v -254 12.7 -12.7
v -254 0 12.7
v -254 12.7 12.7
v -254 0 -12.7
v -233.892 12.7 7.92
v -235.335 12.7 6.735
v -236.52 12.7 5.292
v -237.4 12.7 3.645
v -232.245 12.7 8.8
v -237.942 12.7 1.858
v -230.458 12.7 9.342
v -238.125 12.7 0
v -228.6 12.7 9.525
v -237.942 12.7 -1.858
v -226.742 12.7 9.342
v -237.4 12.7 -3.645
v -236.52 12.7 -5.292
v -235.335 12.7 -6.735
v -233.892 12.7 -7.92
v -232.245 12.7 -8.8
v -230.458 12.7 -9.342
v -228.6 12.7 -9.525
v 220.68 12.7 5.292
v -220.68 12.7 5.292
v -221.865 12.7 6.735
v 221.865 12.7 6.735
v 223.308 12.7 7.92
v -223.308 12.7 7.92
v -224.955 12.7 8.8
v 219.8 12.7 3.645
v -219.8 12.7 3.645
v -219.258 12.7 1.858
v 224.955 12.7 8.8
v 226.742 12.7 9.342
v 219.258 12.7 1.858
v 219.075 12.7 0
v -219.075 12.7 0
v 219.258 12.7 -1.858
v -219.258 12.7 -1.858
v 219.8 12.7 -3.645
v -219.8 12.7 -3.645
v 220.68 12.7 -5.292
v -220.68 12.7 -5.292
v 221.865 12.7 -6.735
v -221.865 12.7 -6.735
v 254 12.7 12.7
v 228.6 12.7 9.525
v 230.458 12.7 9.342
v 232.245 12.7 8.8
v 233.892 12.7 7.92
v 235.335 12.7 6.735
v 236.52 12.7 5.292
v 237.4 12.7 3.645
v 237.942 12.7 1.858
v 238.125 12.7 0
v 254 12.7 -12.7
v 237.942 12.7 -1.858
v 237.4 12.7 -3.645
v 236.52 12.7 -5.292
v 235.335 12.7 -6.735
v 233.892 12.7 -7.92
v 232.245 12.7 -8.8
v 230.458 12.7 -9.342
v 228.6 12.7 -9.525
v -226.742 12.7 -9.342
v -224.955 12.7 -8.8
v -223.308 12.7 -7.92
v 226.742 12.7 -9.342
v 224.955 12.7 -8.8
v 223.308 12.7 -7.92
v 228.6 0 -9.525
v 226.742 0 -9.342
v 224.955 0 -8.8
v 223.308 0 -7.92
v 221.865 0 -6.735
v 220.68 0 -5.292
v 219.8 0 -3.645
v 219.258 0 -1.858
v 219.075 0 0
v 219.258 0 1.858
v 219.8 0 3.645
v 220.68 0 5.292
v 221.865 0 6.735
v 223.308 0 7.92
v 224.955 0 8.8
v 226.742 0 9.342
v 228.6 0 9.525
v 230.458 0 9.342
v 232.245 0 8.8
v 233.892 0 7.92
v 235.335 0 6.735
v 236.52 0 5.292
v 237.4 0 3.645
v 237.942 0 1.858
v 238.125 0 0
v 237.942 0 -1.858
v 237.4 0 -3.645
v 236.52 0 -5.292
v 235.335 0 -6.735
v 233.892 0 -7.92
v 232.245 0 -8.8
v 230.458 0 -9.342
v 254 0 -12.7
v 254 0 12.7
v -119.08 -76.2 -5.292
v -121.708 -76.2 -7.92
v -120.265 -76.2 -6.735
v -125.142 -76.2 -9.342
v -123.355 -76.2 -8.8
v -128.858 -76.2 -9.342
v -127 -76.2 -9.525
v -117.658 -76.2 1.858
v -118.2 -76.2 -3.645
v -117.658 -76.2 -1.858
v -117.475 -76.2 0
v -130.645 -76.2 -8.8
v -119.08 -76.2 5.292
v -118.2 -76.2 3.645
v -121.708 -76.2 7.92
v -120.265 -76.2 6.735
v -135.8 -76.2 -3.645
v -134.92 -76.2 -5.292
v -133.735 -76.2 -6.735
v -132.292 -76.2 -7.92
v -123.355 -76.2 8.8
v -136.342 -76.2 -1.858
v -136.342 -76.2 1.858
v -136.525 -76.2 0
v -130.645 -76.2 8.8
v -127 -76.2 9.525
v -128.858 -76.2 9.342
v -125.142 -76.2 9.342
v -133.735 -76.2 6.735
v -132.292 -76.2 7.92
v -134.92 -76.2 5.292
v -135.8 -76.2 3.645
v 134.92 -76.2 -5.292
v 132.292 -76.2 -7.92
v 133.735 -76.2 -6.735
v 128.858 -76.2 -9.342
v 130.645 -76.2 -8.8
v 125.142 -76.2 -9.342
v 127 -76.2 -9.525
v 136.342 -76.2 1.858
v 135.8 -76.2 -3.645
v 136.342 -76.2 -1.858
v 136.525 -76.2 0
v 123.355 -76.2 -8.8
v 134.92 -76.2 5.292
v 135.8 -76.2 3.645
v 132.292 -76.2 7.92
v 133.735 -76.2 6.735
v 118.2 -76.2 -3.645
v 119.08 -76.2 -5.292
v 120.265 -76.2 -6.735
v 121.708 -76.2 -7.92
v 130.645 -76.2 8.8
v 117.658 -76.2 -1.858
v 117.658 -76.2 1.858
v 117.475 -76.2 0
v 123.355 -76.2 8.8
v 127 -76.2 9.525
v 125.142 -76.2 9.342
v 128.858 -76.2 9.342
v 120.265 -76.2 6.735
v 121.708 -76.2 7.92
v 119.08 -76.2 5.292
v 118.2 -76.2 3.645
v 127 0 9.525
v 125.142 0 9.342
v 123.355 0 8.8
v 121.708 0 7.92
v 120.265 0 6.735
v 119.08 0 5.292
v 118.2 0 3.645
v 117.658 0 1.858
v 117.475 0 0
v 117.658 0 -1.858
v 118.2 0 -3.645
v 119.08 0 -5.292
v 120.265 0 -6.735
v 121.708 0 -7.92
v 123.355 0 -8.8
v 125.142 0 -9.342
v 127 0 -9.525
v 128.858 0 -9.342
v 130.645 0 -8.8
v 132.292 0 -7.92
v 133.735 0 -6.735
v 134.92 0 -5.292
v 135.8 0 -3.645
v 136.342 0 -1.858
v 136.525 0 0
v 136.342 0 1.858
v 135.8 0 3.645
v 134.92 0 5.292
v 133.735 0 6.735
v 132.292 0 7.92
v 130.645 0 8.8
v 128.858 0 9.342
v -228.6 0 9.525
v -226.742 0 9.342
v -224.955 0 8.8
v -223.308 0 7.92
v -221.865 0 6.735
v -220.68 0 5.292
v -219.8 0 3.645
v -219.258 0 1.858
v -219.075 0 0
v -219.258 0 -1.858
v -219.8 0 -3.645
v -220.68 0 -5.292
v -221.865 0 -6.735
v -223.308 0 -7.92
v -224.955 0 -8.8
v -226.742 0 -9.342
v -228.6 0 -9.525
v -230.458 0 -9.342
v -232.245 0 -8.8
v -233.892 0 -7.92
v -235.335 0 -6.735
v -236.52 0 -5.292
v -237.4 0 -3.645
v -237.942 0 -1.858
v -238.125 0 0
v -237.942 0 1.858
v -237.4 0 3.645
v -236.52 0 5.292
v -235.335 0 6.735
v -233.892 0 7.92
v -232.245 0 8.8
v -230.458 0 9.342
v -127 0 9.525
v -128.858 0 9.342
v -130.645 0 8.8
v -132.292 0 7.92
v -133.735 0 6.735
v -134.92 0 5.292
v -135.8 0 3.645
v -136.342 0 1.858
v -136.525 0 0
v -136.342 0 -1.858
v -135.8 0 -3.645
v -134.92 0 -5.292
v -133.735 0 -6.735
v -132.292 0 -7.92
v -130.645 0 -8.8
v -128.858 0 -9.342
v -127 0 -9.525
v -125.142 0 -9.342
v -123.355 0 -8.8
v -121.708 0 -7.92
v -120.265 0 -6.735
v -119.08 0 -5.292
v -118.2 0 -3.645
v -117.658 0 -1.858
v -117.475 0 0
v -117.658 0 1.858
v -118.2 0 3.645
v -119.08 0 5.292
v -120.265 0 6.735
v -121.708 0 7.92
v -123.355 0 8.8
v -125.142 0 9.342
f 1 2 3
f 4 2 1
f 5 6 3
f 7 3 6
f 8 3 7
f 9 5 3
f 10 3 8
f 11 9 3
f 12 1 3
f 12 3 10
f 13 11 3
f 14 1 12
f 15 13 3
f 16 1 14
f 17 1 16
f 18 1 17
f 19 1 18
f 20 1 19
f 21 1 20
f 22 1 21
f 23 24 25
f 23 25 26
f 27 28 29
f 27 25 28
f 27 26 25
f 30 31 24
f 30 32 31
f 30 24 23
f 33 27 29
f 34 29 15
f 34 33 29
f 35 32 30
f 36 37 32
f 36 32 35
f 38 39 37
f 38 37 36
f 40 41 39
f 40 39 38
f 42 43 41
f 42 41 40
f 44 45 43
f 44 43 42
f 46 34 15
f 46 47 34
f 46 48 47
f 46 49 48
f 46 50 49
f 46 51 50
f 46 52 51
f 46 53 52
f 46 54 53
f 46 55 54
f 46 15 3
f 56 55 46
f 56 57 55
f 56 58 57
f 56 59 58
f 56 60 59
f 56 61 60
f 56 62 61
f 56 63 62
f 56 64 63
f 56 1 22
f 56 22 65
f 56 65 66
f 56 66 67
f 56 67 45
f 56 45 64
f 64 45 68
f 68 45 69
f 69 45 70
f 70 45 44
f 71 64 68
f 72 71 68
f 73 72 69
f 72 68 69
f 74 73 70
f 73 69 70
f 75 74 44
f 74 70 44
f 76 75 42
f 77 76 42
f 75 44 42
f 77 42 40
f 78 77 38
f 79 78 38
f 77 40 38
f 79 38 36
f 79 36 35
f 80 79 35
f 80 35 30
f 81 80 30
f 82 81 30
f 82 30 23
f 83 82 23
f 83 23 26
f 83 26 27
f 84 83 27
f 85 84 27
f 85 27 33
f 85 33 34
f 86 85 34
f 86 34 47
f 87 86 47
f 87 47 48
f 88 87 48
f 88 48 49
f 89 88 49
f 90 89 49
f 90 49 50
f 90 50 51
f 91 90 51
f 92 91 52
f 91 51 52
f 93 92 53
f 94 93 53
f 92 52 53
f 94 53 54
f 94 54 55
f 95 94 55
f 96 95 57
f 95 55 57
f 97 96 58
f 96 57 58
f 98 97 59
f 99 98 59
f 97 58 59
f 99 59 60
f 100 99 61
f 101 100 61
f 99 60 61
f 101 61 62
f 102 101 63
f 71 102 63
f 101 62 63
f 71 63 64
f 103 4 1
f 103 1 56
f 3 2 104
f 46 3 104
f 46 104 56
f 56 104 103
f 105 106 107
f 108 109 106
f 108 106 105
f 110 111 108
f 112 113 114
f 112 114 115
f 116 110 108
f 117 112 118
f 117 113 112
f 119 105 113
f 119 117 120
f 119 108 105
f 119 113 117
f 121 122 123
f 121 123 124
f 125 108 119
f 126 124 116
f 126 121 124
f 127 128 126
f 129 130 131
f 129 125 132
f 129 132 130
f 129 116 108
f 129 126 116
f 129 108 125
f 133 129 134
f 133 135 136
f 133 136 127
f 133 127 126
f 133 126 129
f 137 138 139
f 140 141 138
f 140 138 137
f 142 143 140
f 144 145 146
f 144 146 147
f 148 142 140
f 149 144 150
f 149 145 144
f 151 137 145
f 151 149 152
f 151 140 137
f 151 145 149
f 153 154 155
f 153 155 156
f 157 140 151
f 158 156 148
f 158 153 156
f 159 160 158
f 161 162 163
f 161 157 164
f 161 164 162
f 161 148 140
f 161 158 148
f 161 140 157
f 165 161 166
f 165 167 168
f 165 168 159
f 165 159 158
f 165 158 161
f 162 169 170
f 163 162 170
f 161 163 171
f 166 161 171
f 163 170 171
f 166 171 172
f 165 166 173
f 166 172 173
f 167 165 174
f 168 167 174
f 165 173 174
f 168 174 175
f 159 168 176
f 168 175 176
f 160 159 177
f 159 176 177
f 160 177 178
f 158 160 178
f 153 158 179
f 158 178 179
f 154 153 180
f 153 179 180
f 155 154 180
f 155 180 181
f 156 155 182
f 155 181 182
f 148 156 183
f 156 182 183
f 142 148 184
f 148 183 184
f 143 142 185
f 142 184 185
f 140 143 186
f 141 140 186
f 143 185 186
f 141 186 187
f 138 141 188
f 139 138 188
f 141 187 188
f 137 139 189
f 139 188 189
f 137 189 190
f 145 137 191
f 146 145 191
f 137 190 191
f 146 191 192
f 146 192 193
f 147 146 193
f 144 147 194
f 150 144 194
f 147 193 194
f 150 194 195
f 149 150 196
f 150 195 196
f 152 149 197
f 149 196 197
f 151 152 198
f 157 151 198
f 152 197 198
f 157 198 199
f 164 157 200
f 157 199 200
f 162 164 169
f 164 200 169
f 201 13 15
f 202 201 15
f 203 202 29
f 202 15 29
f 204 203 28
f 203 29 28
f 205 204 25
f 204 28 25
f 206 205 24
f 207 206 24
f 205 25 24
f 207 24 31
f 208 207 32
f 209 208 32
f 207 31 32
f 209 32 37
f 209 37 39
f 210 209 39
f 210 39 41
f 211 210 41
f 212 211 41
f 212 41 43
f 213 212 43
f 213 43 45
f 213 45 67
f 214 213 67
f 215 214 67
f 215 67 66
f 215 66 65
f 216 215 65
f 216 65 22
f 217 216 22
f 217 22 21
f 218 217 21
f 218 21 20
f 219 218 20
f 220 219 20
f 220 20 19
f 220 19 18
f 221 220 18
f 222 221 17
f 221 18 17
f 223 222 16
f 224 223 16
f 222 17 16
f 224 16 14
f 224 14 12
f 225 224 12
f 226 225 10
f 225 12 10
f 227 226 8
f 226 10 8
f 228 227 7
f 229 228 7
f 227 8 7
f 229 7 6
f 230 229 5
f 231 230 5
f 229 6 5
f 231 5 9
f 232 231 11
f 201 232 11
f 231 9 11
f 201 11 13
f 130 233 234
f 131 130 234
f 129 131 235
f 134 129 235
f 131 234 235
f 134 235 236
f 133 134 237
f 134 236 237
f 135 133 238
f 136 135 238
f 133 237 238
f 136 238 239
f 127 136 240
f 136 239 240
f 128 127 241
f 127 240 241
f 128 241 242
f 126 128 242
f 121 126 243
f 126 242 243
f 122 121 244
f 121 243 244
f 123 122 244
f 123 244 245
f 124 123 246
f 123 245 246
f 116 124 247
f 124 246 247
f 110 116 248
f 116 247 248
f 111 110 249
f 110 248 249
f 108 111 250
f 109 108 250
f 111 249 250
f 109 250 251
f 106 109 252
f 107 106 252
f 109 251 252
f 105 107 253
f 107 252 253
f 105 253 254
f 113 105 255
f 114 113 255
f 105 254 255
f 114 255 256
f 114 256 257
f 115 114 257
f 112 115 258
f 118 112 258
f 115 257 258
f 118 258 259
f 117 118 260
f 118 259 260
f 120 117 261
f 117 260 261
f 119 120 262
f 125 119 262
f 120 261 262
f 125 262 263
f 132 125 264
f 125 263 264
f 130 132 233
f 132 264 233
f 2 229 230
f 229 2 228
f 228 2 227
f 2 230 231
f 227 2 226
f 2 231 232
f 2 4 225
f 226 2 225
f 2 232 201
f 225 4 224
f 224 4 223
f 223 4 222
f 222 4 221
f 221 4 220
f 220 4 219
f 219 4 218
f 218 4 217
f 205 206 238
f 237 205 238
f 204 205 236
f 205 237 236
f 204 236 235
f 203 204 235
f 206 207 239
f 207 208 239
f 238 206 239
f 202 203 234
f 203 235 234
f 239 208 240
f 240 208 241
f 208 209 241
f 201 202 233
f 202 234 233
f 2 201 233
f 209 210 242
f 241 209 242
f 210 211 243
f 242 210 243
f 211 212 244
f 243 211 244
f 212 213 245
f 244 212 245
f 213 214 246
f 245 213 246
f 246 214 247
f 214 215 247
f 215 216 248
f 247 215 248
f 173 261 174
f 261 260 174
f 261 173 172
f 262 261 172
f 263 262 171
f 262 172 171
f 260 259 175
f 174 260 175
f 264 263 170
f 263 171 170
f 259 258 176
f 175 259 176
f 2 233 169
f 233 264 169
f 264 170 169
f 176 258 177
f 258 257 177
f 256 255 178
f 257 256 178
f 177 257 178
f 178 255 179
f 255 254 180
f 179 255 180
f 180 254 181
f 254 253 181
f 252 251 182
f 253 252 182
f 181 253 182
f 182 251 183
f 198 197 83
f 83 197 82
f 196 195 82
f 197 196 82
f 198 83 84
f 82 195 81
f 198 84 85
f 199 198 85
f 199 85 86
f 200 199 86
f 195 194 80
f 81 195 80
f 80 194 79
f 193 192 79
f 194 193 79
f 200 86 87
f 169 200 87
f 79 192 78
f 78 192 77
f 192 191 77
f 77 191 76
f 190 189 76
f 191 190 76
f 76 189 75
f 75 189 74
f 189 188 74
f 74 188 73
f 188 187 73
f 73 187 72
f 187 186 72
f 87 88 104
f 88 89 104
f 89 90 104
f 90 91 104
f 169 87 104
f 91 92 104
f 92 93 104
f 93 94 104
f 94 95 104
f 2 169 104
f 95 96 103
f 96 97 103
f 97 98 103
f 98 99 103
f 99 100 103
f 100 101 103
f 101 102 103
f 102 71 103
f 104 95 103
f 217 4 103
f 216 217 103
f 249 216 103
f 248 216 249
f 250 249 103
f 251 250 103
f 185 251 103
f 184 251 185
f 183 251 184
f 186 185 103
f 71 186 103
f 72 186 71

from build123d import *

# Parameters (mm, degrees)
SKETCH1_W           = 508
SKETCH1_H           = 25.4
BOSS_EXTRUDE1_DEPTH = 12.7
SKETCH2_R           = 9.525
CUT_EXTRUDE1_DEPTH  = 255.634208228
SKETCH3_R           = 9.525
BOSS_EXTRUDE2_DEPTH = 76.2


with BuildPart() as part:
    # Sketch1 → Boss-Extrude1 (new body)
    with BuildSketch(Plane(origin=(0, 0, 0), x_dir=(1, 0, 0), z_dir=(0, 1, 0))):
        Rectangle(SKETCH1_W, SKETCH1_H)
    extrude(amount=BOSS_EXTRUDE1_DEPTH)

    # Sketch2 → Cut-Extrude1 (cut, through all)
    with BuildSketch(Plane(origin=(0, 12.7, 0), x_dir=(1, 0, 0), z_dir=(0, 1, 0))):
        with Locations(Location((-228.6, 0, 0), (0, 0, 270))):
            Circle(SKETCH2_R)
        with Locations(Location((228.6, 0, 0), (0, 0, 90))):
            Circle(SKETCH2_R)
    extrude(amount=-CUT_EXTRUDE1_DEPTH, mode=Mode.SUBTRACT)

    # Sketch3 → Boss-Extrude2 (add)
    with BuildSketch(Plane.XZ):
        with Locations(Location((-127, 0, 0), (0, 0, 90))):
            Circle(SKETCH3_R)
        with Locations(Location((127, 0, 0), (0, 0, 90))):
            Circle(SKETCH3_R)
    extrude(amount=BOSS_EXTRUDE2_DEPTH)


solid = part.part
